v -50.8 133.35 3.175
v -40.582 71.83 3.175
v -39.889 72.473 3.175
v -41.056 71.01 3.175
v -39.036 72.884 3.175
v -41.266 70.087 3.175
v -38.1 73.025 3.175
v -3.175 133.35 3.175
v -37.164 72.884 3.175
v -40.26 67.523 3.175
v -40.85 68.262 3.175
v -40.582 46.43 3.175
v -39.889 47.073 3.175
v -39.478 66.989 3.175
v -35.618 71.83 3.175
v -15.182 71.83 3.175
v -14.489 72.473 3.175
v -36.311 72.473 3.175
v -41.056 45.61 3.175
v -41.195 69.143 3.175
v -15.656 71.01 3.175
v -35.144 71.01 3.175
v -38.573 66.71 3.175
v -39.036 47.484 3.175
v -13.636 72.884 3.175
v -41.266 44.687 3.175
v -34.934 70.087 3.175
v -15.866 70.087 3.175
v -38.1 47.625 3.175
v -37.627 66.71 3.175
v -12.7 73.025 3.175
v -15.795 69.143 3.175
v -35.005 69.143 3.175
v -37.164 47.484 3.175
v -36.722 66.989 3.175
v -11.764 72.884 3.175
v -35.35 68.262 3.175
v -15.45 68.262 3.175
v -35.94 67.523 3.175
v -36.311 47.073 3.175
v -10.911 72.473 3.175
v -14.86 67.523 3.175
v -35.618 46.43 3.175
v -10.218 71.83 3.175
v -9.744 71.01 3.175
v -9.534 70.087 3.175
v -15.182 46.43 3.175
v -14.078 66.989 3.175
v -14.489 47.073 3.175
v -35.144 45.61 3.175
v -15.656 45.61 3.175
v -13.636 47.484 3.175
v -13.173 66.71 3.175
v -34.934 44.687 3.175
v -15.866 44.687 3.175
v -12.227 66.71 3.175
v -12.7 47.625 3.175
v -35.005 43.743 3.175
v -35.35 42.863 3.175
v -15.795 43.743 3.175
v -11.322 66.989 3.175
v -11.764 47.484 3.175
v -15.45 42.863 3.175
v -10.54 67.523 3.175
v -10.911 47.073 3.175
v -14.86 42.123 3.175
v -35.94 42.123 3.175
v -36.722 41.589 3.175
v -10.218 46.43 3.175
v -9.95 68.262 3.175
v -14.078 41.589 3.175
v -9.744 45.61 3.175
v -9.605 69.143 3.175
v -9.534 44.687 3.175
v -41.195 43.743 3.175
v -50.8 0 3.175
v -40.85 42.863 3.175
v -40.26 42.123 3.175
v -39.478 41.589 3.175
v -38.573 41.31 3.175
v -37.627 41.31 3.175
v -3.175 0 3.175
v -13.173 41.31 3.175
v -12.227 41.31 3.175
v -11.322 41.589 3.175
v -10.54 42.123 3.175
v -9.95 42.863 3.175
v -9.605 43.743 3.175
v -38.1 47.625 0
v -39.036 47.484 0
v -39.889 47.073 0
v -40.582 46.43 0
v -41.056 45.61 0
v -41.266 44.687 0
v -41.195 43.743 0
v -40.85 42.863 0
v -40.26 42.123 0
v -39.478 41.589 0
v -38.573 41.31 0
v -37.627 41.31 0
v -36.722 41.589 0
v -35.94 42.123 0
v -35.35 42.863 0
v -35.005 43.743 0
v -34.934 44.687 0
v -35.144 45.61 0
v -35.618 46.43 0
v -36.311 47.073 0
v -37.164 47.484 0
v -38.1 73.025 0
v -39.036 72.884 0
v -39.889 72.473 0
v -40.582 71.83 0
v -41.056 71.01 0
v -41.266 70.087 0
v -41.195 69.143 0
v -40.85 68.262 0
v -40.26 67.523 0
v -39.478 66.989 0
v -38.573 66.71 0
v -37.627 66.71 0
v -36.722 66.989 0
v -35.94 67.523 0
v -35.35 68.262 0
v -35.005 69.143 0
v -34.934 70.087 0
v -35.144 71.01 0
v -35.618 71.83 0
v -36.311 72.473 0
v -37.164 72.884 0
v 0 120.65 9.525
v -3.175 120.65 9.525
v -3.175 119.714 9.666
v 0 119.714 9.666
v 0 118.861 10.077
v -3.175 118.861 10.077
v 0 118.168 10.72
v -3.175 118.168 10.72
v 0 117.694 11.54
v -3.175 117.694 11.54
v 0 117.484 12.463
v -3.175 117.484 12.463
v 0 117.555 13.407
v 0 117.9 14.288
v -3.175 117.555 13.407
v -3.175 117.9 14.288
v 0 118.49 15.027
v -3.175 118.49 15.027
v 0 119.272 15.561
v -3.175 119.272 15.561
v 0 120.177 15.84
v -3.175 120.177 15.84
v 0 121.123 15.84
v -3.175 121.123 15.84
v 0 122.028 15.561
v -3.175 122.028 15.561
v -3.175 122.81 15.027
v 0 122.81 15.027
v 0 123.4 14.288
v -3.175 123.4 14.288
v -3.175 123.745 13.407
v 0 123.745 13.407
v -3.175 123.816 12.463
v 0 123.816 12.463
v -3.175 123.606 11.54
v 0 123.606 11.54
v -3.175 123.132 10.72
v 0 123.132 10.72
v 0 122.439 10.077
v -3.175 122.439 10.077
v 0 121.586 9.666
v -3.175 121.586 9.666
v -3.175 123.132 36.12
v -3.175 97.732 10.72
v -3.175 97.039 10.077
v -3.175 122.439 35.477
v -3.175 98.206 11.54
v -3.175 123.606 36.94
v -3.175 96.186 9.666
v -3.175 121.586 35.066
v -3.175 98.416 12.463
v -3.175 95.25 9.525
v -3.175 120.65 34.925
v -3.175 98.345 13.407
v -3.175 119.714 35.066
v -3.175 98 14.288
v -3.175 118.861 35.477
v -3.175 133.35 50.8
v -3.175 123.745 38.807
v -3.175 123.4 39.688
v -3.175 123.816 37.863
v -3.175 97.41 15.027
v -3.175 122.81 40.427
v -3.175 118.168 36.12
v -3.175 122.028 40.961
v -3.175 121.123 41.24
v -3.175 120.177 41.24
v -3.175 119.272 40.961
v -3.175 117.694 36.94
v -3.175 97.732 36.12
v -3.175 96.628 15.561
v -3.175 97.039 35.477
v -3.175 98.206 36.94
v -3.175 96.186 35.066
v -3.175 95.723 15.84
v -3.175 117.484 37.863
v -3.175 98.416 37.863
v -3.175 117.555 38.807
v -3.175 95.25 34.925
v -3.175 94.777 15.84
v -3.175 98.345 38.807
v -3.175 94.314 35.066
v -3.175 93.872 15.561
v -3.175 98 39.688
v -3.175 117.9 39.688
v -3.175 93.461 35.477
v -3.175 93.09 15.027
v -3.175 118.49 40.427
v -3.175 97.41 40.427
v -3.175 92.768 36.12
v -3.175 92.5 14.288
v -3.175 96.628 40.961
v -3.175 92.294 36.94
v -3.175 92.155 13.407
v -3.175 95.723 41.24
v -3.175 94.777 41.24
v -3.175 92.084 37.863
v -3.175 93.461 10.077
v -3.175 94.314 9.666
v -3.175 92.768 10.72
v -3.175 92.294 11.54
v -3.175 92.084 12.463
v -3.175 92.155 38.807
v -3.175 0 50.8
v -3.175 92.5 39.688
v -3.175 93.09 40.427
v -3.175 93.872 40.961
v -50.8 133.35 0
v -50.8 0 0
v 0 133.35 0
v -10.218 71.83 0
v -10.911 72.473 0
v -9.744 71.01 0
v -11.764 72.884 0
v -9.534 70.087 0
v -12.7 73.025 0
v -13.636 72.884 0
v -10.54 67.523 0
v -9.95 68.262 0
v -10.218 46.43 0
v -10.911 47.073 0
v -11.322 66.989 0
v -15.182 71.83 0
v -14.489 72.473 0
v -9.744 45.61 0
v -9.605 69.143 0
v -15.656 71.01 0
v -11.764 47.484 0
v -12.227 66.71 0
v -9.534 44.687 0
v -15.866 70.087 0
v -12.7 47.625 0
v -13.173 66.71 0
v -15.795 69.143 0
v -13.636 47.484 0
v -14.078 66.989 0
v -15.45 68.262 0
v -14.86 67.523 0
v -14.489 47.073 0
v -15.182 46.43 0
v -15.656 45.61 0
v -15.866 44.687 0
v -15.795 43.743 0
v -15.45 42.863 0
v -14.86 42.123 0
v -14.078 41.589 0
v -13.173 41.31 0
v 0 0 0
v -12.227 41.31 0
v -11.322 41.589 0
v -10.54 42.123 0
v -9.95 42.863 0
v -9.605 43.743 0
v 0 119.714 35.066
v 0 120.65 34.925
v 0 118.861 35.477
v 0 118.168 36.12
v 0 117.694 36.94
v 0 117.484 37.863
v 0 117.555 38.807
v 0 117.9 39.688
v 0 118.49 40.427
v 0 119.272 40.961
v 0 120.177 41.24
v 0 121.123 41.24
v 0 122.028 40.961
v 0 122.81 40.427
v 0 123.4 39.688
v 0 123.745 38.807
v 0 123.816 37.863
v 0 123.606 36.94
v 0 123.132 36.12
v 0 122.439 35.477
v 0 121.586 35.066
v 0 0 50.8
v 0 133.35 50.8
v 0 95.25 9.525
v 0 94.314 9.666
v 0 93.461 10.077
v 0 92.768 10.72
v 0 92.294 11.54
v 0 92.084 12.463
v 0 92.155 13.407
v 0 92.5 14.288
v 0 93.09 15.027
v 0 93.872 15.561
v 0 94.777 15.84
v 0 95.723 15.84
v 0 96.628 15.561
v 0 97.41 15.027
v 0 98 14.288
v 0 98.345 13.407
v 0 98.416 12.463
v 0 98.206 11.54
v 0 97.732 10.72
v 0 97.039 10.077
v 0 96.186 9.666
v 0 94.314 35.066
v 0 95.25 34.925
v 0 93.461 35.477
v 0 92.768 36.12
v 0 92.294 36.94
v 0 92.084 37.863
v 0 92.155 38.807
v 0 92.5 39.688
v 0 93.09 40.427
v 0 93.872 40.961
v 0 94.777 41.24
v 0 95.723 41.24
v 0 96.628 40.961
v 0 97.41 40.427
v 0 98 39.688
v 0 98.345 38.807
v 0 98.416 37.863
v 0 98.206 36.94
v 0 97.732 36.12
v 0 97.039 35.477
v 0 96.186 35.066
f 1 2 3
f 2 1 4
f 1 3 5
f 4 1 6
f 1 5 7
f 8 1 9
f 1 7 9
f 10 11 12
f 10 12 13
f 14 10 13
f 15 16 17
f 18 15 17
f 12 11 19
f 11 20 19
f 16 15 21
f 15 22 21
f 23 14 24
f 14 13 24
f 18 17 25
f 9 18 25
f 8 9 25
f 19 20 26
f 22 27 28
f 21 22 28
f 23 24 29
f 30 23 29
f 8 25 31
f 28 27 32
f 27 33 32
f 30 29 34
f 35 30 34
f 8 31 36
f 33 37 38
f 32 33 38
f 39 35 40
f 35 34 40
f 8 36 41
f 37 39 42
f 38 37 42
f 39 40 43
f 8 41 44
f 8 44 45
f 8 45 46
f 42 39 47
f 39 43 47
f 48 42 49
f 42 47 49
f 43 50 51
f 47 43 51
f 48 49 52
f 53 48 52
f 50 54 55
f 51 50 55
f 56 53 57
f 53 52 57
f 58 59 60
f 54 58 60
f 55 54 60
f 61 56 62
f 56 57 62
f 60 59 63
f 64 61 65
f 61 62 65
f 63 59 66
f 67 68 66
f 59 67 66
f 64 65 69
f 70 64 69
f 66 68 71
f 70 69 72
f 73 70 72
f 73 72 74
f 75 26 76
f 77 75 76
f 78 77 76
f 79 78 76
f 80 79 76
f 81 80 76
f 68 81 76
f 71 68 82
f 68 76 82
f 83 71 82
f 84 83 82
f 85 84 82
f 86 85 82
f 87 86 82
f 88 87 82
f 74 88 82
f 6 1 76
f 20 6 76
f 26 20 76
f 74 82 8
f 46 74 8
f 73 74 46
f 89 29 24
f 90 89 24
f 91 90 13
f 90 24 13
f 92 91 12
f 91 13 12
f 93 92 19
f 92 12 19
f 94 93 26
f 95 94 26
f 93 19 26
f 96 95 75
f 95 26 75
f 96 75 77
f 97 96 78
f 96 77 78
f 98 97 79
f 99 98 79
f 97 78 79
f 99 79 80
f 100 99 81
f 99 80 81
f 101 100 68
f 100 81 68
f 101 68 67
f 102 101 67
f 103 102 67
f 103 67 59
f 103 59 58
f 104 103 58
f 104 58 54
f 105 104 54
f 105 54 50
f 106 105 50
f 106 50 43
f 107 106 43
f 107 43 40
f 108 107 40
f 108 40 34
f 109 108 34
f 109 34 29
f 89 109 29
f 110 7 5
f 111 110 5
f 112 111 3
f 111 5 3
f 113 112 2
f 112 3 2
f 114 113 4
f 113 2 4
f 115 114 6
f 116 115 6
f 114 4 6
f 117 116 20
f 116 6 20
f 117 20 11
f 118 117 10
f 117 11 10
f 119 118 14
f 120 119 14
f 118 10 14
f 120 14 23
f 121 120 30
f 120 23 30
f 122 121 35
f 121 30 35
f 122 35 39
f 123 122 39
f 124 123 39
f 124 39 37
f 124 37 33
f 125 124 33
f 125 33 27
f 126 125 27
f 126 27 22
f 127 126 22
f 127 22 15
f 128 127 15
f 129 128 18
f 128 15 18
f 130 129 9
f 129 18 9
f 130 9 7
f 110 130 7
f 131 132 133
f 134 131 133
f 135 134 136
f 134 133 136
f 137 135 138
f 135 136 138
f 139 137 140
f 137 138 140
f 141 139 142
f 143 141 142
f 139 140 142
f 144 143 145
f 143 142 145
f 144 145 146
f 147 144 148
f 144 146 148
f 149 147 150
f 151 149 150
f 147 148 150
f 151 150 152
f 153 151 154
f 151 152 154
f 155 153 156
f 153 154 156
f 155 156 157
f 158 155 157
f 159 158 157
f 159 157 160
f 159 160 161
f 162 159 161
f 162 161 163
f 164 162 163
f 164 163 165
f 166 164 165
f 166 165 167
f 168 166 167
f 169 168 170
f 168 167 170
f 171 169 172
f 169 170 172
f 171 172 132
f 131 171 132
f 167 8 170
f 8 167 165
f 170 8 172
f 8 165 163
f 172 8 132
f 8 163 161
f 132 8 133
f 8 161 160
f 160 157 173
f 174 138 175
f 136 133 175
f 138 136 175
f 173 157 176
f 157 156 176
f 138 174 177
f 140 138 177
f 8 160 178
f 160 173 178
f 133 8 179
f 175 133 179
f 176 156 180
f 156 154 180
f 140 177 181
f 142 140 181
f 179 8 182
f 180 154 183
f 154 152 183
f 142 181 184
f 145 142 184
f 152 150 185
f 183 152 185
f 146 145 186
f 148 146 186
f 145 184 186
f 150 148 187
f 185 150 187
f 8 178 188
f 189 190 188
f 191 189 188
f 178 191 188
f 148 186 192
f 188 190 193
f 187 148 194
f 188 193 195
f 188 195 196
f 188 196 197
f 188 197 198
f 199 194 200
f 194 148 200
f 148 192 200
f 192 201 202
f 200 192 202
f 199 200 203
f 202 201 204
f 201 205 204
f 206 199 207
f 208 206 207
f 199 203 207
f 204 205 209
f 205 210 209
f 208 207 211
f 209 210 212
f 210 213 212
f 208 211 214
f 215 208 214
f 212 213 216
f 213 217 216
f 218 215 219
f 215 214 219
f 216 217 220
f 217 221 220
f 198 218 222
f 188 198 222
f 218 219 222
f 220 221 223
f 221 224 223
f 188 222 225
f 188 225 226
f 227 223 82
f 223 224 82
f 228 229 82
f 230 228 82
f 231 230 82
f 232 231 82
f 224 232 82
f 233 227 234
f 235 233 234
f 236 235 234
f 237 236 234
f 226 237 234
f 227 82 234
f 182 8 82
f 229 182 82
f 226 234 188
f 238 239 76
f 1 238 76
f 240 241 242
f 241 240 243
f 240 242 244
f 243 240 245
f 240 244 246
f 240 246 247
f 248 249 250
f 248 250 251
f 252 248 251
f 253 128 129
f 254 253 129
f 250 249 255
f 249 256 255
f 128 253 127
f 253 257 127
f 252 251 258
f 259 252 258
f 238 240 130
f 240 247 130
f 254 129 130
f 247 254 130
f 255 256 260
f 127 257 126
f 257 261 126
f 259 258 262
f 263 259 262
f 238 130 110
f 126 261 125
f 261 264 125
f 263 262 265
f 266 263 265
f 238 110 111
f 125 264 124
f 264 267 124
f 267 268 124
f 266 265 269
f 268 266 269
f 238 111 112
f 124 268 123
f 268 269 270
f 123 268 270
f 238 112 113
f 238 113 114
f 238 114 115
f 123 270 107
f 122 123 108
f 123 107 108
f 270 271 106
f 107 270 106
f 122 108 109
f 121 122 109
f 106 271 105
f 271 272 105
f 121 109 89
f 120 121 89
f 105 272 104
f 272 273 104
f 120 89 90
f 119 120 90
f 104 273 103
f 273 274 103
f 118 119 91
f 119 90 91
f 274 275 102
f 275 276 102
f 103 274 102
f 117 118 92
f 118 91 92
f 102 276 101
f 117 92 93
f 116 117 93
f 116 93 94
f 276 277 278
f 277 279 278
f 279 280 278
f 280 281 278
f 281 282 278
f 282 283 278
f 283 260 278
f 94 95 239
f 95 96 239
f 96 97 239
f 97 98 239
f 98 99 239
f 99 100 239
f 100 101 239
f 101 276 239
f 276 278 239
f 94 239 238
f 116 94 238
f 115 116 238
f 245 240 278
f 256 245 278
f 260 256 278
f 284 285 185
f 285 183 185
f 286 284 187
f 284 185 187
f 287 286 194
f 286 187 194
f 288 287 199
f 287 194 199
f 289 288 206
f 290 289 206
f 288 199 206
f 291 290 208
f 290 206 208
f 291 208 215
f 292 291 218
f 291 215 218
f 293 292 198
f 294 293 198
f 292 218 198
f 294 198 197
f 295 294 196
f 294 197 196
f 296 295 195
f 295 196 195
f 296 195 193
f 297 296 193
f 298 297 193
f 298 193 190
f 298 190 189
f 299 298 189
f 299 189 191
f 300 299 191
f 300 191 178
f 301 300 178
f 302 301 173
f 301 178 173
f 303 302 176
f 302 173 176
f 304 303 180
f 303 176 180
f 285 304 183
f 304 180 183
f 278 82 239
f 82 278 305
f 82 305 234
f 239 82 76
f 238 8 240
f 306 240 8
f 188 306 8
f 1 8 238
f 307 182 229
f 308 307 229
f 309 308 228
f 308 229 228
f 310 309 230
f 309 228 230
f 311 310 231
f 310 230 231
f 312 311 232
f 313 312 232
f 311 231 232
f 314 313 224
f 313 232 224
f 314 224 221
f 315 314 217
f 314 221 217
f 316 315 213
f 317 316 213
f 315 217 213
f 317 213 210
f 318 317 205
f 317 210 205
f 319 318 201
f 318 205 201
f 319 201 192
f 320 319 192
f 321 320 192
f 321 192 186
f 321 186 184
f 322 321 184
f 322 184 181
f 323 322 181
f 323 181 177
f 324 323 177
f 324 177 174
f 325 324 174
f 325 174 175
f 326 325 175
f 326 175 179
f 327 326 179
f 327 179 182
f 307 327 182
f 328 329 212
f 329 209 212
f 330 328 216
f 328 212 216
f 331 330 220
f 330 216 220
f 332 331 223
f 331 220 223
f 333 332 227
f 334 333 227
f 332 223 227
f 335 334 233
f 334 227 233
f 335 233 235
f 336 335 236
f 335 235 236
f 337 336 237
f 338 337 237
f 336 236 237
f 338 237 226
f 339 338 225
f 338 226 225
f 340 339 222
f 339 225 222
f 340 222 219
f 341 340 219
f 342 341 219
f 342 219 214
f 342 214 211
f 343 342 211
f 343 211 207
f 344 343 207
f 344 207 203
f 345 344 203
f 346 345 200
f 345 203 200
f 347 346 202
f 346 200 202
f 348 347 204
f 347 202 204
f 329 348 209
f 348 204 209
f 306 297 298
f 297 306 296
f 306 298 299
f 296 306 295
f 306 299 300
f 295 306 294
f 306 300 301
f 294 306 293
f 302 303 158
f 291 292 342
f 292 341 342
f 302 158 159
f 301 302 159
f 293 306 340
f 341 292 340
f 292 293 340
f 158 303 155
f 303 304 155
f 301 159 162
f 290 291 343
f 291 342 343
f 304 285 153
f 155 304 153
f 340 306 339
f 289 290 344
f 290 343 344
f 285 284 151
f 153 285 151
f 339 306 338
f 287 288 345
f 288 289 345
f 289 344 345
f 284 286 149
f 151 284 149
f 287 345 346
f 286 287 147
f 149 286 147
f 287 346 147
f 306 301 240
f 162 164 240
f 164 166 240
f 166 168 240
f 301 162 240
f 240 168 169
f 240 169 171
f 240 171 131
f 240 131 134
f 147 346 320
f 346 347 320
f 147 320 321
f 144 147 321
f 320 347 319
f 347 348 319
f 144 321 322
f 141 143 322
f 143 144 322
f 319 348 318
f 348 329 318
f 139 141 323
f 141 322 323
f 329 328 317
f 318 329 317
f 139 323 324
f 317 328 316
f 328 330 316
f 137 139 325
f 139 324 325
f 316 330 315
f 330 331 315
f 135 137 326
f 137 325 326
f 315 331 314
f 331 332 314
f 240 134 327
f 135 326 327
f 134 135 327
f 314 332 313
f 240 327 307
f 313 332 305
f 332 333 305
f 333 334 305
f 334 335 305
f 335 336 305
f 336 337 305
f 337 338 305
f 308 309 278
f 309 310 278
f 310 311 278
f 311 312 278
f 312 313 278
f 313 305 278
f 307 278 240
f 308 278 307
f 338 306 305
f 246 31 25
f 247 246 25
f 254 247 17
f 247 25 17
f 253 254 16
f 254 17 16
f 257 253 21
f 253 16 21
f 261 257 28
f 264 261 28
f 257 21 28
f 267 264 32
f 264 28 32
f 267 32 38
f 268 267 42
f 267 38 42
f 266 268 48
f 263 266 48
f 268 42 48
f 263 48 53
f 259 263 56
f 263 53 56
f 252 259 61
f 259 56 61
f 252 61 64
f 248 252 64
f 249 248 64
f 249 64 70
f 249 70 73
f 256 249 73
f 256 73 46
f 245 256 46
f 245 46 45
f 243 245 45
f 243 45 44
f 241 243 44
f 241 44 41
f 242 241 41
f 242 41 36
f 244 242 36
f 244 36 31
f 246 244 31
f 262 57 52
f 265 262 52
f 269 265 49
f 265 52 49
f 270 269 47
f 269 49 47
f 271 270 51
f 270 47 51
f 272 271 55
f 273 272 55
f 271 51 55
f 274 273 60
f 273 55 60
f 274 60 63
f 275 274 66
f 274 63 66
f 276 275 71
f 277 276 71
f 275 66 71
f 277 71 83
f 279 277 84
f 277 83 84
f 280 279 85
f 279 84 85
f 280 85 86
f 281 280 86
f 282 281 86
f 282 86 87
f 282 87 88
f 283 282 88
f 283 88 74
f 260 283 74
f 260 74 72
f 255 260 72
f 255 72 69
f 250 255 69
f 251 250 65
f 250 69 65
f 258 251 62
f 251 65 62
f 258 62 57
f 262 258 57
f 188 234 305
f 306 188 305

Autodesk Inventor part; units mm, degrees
ref_plane "YZ Plane" through (0, 0, 0) normal (1, 0, 0) x (0, 1, 0)
ref_plane "XZ Plane" through (0, 0, 0) normal (0, 1, 0) x (-1, 0, 0)
ref_plane "XY Plane" through (0, 0, 0) normal (0, 0, 1) x (1, 0, 0)
sketch "Sketch1" plane through (0, 0, 0) normal (0, 1, 0) x (-1, 0, 0)
  line L0 (0, 0) -> (3.175, 0)
  line L1 (3.175, 0) -> (3.175, 50.8)
  line L2 (3.175, 50.8) -> (0, 50.8)
  line L3 (0, 50.8) -> (0, 0)
  line L4 (0, 0) -> (50.8, 0)
  line L5 (50.8, 0) -> (50.8, 3.175)
  line L6 (50.8, 3.175) -> (0, 3.175)
  line L7 (0, 3.175) -> (0, 0)
  dimension "d0" = 3.175
  dimension "d1" = 50.8
  dimension "d2" = 50.8
  dimension "d3" = 3.175
extrude "Extrusion1" add sketch "Sketch1" along normal blind 133.35
sketch "Sketch2" plane through (0, 0, 50.8) normal (1, 0, 0) x (0, 0, -1)
  line L0 (0, 0) -> (50.8, 0) projected
  line L1 (50.8, 0) -> (50.8, 133.35) projected
  line L2 (0, 133.35) -> (50.8, 133.35) projected
  line L3 (0, 0) -> (0, 133.35) projected
  point P0 (12.7, 120.65)
  point P1 (38.1, 120.65)
  point P2 (38.1, 95.25)
  point P3 (12.7, 95.25)
  dimension "d6" = 12.7
  dimension "d7" = 12.7
  dimension "d8" = 12.7
  dimension "d9" = 12.7
  dimension "d10" = 12.7
  dimension "d11" = 12.7
  dimension "d12" = 38.1
  dimension "d13" = 38.1
hole "Hole1" at (0, 120.65, 38.1) at (0, 120.65, 12.7) at (0, 95.25, 12.7) at (0, 95.25, 38.1) direction (-1, 0, 0) diameter 6.35 end through all
sketch "Sketch3" plane through (0, 0, 0) normal (0, 0, -1) x (-1, 0, 0)
  line L0 (0, 133.35) -> (50.8, 133.35) projected
  line L1 (0, 0) -> (0, 133.35) projected
  line L2 (0, 0) -> (50.8, 0) projected
  line L3 (50.8, 0) -> (50.8, 133.35) projected
  point P0 (12.7, 69.85)
  point P1 (38.1, 69.85)
  point P2 (38.1, 44.45)
  point P3 (12.7, 44.45)
  dimension "d21" = 12.7
  dimension "d22" = 12.7
  dimension "d23" = 63.5
  dimension "d24" = 63.5
  dimension "d32" = 88.9
  dimension "d33" = 88.9
  dimension "d34" = 12.7
  dimension "d35" = 12.7
hole "Hole3" at (-12.7, 69.85, 0) at (-38.1, 69.85, 0) at (-38.1, 44.45, 0) at (-12.7, 44.45, 0) direction (0, 0, 1) diameter 6.35 end through all
properties part number "2x2 angle vertical right"
